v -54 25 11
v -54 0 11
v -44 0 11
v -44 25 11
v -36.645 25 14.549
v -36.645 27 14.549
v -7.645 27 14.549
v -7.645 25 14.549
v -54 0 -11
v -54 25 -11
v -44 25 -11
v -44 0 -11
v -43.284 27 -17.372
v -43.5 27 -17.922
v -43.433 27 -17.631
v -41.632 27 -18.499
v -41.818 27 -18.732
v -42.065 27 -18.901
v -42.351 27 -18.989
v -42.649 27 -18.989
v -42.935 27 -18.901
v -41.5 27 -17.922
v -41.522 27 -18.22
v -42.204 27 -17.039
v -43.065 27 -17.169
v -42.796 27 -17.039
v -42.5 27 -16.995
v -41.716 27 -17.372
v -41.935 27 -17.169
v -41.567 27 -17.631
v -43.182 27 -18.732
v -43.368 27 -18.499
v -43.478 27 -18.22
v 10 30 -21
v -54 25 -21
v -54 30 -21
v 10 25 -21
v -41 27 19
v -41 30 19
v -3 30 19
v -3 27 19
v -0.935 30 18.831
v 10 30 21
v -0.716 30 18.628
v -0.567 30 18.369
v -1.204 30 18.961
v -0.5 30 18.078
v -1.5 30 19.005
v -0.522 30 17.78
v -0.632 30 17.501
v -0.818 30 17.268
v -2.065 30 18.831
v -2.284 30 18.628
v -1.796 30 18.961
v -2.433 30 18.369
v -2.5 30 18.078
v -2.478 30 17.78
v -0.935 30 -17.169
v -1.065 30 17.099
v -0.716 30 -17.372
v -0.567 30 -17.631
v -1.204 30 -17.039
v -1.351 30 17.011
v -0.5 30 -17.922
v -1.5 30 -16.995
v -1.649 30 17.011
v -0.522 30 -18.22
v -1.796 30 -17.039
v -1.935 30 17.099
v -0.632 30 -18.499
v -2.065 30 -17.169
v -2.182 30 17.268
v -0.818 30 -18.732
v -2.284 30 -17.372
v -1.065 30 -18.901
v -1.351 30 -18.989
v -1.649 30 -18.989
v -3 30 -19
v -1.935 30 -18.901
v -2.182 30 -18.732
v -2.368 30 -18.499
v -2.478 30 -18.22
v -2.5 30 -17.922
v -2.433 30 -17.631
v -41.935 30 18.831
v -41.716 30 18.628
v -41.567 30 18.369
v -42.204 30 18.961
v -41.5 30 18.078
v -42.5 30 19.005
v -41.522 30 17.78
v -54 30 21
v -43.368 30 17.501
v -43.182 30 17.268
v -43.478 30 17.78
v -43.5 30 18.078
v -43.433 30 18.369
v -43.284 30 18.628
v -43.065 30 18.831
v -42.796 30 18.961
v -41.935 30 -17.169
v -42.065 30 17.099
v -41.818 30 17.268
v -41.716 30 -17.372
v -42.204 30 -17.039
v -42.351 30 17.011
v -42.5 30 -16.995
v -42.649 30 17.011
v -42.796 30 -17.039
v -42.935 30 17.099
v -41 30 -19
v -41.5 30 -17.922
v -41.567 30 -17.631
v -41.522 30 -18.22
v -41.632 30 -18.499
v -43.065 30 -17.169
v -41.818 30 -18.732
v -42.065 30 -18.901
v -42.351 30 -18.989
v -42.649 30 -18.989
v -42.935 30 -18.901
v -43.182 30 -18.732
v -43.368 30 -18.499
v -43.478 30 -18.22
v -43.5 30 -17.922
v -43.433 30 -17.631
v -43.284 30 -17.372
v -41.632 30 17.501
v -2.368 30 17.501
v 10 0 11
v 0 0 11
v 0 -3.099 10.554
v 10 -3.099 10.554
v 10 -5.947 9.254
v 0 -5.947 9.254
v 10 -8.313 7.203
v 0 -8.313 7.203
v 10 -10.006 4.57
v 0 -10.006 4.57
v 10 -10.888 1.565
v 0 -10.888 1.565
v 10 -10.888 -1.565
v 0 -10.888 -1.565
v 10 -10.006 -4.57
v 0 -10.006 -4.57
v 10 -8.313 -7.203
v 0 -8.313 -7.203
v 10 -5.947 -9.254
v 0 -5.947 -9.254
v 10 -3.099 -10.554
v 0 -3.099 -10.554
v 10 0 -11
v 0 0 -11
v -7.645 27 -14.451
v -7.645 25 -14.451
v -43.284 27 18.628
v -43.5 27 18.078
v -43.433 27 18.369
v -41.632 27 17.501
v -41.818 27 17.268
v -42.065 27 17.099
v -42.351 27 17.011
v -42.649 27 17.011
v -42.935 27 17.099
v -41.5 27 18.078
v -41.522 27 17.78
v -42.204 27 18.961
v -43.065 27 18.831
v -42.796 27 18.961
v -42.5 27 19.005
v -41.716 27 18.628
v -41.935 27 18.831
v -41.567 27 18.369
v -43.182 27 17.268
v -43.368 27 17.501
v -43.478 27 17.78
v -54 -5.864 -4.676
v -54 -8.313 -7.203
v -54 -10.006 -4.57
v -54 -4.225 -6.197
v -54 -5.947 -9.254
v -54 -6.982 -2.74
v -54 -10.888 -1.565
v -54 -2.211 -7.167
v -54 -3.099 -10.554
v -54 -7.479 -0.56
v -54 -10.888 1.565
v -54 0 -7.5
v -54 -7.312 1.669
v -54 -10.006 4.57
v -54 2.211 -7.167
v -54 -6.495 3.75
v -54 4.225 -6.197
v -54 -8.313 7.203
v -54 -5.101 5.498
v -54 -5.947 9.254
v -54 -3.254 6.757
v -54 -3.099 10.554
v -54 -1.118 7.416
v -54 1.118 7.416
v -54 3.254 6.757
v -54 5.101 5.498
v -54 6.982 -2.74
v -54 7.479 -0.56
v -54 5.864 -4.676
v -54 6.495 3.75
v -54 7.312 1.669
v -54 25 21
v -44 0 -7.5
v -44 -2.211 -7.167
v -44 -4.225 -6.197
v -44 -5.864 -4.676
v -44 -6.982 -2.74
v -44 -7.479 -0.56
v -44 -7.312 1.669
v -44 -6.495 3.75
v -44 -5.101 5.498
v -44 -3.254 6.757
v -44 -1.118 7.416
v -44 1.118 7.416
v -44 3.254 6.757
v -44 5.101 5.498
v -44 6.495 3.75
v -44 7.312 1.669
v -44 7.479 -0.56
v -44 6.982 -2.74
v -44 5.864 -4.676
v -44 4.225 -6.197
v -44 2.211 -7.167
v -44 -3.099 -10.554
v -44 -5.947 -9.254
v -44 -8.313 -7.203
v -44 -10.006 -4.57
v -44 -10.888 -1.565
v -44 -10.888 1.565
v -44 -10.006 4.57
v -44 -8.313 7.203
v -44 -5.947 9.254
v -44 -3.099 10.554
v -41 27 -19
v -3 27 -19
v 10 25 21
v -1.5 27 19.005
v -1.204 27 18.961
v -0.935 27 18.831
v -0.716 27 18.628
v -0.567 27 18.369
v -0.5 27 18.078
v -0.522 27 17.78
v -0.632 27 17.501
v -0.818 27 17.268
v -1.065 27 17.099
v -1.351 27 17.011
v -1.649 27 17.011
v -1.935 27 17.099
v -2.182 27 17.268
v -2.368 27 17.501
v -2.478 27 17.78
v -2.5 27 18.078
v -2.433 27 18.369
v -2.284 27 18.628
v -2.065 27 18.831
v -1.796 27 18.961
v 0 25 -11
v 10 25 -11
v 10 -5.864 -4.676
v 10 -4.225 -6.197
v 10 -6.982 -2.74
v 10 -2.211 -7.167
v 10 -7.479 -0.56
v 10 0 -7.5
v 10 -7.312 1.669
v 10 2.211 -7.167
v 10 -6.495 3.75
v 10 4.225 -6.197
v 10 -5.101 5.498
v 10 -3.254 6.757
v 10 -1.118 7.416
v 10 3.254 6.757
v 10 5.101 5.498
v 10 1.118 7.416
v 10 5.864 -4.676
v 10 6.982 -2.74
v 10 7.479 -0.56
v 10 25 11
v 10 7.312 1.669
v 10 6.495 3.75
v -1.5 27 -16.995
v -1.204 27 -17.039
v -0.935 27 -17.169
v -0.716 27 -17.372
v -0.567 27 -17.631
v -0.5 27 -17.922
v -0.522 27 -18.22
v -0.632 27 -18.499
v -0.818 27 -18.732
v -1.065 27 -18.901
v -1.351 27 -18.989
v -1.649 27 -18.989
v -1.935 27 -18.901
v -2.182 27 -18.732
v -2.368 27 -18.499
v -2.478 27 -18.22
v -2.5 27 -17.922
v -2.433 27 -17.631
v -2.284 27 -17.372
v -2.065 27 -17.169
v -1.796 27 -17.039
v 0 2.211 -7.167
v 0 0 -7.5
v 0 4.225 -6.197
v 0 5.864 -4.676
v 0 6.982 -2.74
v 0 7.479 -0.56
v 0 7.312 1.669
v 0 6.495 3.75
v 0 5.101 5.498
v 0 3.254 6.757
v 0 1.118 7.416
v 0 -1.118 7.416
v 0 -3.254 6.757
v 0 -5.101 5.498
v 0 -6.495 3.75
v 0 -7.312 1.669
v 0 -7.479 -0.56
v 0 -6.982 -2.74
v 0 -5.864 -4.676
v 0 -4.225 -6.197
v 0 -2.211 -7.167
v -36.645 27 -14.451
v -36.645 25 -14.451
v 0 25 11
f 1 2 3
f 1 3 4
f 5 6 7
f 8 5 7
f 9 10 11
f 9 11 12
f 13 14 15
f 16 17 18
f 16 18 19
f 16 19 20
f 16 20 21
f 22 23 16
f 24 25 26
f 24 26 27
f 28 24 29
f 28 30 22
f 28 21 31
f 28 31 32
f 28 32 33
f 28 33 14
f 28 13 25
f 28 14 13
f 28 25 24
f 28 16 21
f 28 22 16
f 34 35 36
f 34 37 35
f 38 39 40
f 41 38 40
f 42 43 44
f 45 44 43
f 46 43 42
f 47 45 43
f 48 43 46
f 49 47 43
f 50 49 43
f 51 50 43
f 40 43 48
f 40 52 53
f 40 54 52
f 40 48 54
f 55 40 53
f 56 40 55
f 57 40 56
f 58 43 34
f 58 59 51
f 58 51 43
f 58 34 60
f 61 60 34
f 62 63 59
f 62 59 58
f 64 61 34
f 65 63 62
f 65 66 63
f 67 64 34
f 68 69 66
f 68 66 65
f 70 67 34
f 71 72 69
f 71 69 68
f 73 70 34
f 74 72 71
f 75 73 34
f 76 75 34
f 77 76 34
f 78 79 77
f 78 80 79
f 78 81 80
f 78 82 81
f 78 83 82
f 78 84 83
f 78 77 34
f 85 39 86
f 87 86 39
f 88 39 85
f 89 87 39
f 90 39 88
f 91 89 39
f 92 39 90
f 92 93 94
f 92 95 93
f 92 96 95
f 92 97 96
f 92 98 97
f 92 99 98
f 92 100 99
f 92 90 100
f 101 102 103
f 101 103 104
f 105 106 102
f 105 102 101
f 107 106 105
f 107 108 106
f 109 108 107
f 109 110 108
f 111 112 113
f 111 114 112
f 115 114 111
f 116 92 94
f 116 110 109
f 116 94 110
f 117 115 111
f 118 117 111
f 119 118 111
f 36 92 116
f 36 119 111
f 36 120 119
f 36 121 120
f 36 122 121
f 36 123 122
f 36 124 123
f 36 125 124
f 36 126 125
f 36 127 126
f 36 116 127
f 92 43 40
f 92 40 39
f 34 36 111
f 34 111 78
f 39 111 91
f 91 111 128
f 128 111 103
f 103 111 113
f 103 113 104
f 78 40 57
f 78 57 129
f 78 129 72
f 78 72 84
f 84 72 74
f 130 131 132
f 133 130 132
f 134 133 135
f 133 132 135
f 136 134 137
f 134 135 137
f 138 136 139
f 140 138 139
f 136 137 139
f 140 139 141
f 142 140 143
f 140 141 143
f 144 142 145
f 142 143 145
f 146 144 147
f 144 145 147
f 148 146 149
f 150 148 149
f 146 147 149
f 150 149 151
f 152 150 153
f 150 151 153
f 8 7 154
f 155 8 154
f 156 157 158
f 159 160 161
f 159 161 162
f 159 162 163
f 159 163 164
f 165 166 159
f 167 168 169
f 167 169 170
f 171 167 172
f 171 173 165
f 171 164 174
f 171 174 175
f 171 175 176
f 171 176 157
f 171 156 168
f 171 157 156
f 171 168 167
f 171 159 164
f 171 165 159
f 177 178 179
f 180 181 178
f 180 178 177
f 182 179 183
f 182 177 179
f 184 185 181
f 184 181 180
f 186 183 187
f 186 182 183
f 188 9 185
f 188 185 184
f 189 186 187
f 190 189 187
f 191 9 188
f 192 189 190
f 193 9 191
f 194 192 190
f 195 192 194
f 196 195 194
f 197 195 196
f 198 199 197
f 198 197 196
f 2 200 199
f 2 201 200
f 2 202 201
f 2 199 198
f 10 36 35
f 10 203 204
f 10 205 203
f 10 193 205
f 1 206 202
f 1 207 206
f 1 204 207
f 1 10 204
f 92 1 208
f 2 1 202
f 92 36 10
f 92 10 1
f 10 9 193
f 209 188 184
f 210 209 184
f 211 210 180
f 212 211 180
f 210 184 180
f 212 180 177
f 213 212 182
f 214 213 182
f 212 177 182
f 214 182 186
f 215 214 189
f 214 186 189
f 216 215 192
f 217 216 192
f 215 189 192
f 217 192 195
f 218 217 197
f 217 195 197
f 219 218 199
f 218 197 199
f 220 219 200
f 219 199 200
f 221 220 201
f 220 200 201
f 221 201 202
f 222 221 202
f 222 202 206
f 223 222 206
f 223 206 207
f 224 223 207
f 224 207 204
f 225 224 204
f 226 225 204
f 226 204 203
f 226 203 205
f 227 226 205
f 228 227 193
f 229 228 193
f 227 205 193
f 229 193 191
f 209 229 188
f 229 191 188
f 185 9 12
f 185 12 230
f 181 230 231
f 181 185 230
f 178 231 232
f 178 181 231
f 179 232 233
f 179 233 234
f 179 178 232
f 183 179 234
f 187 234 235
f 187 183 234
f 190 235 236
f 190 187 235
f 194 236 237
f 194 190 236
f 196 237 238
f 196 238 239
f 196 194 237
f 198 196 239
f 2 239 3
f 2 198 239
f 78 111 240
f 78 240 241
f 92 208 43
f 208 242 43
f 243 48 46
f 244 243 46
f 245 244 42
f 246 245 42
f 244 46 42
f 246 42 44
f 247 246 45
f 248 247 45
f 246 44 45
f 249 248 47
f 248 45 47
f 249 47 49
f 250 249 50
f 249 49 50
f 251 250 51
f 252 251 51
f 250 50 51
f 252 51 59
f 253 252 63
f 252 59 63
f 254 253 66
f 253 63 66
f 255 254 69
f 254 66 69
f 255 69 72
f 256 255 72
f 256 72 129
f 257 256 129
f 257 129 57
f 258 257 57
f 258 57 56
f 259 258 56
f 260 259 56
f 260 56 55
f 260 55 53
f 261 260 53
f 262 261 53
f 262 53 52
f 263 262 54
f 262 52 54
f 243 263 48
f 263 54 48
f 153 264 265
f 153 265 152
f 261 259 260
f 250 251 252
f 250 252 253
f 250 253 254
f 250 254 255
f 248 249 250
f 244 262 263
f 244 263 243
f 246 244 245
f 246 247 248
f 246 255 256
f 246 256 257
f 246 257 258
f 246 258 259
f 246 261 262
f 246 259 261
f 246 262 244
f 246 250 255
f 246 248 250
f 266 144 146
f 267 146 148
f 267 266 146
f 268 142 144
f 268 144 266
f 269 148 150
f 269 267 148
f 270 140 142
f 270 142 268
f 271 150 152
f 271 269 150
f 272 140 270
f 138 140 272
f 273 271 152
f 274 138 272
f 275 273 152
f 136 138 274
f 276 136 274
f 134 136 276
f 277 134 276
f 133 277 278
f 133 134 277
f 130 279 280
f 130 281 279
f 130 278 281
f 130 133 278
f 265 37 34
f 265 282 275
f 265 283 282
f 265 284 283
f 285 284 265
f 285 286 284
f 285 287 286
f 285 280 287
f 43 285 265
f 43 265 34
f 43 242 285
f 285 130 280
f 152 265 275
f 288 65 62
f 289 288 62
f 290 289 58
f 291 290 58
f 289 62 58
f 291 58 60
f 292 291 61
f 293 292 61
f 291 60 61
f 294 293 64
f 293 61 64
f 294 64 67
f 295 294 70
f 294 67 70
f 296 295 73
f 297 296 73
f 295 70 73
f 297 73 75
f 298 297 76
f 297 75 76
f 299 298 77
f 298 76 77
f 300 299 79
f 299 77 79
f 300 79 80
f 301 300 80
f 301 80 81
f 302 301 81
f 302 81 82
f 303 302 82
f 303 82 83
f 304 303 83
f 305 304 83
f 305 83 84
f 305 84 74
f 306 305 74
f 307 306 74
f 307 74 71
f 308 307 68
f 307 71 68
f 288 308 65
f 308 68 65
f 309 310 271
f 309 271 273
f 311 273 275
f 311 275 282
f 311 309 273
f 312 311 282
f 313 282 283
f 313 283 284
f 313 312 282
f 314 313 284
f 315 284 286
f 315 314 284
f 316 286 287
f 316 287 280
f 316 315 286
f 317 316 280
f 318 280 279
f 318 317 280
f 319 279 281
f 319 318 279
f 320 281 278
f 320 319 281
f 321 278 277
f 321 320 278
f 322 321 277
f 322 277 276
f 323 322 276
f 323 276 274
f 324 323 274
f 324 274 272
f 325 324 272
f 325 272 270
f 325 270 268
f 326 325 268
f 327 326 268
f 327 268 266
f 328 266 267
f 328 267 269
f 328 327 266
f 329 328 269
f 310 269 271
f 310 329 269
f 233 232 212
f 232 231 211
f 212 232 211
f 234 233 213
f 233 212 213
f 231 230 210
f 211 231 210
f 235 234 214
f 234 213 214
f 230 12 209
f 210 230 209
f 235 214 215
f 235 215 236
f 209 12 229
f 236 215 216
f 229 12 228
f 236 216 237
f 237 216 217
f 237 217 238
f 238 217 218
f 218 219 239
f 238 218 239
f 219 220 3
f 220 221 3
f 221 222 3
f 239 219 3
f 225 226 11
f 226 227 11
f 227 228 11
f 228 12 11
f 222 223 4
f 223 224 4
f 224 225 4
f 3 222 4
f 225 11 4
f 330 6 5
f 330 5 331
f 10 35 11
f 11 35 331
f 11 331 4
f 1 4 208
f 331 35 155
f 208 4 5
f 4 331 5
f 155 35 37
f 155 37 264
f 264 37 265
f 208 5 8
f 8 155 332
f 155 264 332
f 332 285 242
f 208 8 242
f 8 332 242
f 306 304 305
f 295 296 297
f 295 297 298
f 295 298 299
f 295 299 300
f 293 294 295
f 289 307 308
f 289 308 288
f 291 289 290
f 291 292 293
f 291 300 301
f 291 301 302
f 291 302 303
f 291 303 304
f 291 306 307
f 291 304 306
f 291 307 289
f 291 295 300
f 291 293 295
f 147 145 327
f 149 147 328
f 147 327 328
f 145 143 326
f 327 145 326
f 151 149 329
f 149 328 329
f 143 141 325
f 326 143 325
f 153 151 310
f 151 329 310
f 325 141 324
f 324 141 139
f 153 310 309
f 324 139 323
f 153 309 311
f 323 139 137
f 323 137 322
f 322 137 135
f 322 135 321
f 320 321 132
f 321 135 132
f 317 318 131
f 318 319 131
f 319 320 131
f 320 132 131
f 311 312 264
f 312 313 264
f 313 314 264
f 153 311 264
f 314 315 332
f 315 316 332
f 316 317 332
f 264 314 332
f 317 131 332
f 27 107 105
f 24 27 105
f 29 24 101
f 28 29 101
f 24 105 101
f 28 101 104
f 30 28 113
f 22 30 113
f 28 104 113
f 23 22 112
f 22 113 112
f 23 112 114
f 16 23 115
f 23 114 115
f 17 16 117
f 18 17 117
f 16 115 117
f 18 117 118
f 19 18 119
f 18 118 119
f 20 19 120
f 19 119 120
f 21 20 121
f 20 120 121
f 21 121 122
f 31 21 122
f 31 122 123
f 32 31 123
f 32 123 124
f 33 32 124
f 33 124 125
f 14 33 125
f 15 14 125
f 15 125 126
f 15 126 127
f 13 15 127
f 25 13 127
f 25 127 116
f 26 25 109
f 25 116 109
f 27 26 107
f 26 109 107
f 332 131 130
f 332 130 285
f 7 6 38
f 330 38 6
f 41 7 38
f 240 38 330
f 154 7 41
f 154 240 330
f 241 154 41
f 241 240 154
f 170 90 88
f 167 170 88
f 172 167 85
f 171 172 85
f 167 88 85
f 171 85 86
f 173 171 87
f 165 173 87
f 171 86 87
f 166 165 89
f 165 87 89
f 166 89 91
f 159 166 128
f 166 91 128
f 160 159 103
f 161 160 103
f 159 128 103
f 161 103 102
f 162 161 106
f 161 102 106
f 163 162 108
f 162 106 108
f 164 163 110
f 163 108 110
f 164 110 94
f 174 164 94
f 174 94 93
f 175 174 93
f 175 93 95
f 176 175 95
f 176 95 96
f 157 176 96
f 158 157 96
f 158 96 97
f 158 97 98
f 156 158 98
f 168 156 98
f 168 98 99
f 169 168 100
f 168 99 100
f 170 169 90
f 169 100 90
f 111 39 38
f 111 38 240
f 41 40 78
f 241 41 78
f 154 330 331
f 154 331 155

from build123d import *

# Parameters (mm, degrees)
SKETCH1_R            = 11
SKETCH1_R_2          = 7.5
EXTRUDE_THIN1_DEPTH  = 10
BOSS_EXTRUDE2_DEPTH  = 10
SKETCH6_W            = 10
SKETCH6_H            = 5
BOSS_EXTRUDE3_DEPTH  = 10
SKETCH8_W            = 10
SKETCH8_H            = 5
BOSS_EXTRUDE4_DEPTH  = 10
SKETCH9_W            = 42
SKETCH9_H            = 5
BOSS_EXTRUDE5_DEPTH  = 54
LPATTERN3_COUNT      = 2
LPATTERN3_PITCH      = 54
SKETCH15_R           = 11
BOSS_EXTRUDE6_DEPTH  = 10
SKETCH17_R           = 7.5
CUT_EXTRUDE1_DEPTH   = 10
SKETCH19_W           = 38
SKETCH19_H           = 38
CUT_EXTRUDE3_DEPTH   = 3
SKETCH25_W           = 29
SKETCH25_H           = 29
CUT_EXTRUDE4_DEPTH   = 2
SKETCH26_R           = 1.00264766
CUT_EXTRUDE5_DEPTH   = 3
LPATTERN4_COUNT      = 2
LPATTERN4_PITCH      = 36
LPATTERN4_COUNT_DIR2 = 2
LPATTERN4_PITCH_DIR2 = 41


with BuildPart() as part:
    # Sketch1 → Extrude-Thin1 (new body)
    with BuildSketch(Plane(origin=(0, 0, 0), x_dir=(0, 0, -1), z_dir=(1, 0, 0))):
        Circle(SKETCH1_R)
        Circle(SKETCH1_R_2, mode=Mode.SUBTRACT)
    extrude(amount=EXTRUDE_THIN1_DEPTH)

    # Sketch3 → Boss-Extrude2 (add)
    with BuildSketch(Plane(origin=(0, 0, 0), x_dir=(0, 0, -1), z_dir=(1, 0, 0))):
        with BuildLine():
            Line((-11, 0), (-11, 30))
            Line((-11, 30), (11, 30))
            Line((11, 30), (11, 0))
            ThreePointArc((11, 0), (0, 11), (-11, 0))
        make_face()
    boss_extrude2 = extrude(amount=BOSS_EXTRUDE2_DEPTH)

    # Sketch6 → Boss-Extrude3 (add)
    with BuildSketch(Plane.XY.offset(11)):
        with Locations((5, 27.5)):
            Rectangle(SKETCH6_W, SKETCH6_H)
    extrude(amount=BOSS_EXTRUDE3_DEPTH)

    # Sketch8 → Boss-Extrude4 (add)
    with BuildSketch(Plane(origin=(0, 0, -11), x_dir=(-1, 0, 0), z_dir=(0, 0, -1))):
        with Locations((-5, 27.5)):
            Rectangle(SKETCH8_W, SKETCH8_H)
    extrude(amount=BOSS_EXTRUDE4_DEPTH)

    # Sketch9 → Boss-Extrude5 (add)
    with BuildSketch(Plane.ZY):
        with Locations((0, 27.5)):
            Rectangle(SKETCH9_W, SKETCH9_H)
    extrude(amount=BOSS_EXTRUDE5_DEPTH)

    # LPattern3: Boss-Extrude2 ×2
    with Locations(*[(-i * LPATTERN3_PITCH, 0, 0) for i in range(1, LPATTERN3_COUNT)]):
        add(boss_extrude2)

    # Sketch15 → Boss-Extrude6 (add)
    with BuildSketch(Plane.ZY.offset(54)):
        Circle(SKETCH15_R)
    extrude(amount=-BOSS_EXTRUDE6_DEPTH)

    # Sketch17 → Cut-Extrude1 (cut)
    with BuildSketch(Plane.ZY.offset(54)):
        with Locations(Location((0, 0, 0), (0, 0, 180))):
            Circle(SKETCH17_R)
    extrude(amount=-CUT_EXTRUDE1_DEPTH, mode=Mode.SUBTRACT)

    # Sketch19 → Cut-Extrude3 (cut)
    with BuildSketch(Plane(origin=(0, 30, 0), x_dir=(1, 0, 0), z_dir=(0, 1, 0))):
        with Locations((-22, 0)):
            Rectangle(SKETCH19_W, SKETCH19_H)
    extrude(amount=-CUT_EXTRUDE3_DEPTH, mode=Mode.SUBTRACT)

    # Sketch25 → Cut-Extrude4 (cut)
    with BuildSketch(Plane(origin=(0, 27, 0), x_dir=(1, 0, 0), z_dir=(0, 1, 0))):
        with Locations((-22.144950272, -0.049169749)):
            Rectangle(SKETCH25_W, SKETCH25_H)
    extrude(amount=-CUT_EXTRUDE4_DEPTH, mode=Mode.SUBTRACT)

    # Sketch26 → Cut-Extrude5 (cut)
    with BuildSketch(Plane(origin=(0, 30, 0), x_dir=(1, 0, 0), z_dir=(0, 1, 0))):
        with Locations(Location((-1.5, 17.99735234, 0), (0, 0, 270))):
            Circle(SKETCH26_R)
    cut_extrude5 = extrude(amount=-CUT_EXTRUDE5_DEPTH, mode=Mode.SUBTRACT)

    # LPattern4: Cut-Extrude5 2 × 2
    with Locations(*[(-j * LPATTERN4_PITCH_DIR2, 0, i * LPATTERN4_PITCH) for i in range(LPATTERN4_COUNT) for j in range(LPATTERN4_COUNT_DIR2) if (i, j) != (0, 0)]):
        add(cut_extrude5, mode=Mode.SUBTRACT)


solid = part.part
